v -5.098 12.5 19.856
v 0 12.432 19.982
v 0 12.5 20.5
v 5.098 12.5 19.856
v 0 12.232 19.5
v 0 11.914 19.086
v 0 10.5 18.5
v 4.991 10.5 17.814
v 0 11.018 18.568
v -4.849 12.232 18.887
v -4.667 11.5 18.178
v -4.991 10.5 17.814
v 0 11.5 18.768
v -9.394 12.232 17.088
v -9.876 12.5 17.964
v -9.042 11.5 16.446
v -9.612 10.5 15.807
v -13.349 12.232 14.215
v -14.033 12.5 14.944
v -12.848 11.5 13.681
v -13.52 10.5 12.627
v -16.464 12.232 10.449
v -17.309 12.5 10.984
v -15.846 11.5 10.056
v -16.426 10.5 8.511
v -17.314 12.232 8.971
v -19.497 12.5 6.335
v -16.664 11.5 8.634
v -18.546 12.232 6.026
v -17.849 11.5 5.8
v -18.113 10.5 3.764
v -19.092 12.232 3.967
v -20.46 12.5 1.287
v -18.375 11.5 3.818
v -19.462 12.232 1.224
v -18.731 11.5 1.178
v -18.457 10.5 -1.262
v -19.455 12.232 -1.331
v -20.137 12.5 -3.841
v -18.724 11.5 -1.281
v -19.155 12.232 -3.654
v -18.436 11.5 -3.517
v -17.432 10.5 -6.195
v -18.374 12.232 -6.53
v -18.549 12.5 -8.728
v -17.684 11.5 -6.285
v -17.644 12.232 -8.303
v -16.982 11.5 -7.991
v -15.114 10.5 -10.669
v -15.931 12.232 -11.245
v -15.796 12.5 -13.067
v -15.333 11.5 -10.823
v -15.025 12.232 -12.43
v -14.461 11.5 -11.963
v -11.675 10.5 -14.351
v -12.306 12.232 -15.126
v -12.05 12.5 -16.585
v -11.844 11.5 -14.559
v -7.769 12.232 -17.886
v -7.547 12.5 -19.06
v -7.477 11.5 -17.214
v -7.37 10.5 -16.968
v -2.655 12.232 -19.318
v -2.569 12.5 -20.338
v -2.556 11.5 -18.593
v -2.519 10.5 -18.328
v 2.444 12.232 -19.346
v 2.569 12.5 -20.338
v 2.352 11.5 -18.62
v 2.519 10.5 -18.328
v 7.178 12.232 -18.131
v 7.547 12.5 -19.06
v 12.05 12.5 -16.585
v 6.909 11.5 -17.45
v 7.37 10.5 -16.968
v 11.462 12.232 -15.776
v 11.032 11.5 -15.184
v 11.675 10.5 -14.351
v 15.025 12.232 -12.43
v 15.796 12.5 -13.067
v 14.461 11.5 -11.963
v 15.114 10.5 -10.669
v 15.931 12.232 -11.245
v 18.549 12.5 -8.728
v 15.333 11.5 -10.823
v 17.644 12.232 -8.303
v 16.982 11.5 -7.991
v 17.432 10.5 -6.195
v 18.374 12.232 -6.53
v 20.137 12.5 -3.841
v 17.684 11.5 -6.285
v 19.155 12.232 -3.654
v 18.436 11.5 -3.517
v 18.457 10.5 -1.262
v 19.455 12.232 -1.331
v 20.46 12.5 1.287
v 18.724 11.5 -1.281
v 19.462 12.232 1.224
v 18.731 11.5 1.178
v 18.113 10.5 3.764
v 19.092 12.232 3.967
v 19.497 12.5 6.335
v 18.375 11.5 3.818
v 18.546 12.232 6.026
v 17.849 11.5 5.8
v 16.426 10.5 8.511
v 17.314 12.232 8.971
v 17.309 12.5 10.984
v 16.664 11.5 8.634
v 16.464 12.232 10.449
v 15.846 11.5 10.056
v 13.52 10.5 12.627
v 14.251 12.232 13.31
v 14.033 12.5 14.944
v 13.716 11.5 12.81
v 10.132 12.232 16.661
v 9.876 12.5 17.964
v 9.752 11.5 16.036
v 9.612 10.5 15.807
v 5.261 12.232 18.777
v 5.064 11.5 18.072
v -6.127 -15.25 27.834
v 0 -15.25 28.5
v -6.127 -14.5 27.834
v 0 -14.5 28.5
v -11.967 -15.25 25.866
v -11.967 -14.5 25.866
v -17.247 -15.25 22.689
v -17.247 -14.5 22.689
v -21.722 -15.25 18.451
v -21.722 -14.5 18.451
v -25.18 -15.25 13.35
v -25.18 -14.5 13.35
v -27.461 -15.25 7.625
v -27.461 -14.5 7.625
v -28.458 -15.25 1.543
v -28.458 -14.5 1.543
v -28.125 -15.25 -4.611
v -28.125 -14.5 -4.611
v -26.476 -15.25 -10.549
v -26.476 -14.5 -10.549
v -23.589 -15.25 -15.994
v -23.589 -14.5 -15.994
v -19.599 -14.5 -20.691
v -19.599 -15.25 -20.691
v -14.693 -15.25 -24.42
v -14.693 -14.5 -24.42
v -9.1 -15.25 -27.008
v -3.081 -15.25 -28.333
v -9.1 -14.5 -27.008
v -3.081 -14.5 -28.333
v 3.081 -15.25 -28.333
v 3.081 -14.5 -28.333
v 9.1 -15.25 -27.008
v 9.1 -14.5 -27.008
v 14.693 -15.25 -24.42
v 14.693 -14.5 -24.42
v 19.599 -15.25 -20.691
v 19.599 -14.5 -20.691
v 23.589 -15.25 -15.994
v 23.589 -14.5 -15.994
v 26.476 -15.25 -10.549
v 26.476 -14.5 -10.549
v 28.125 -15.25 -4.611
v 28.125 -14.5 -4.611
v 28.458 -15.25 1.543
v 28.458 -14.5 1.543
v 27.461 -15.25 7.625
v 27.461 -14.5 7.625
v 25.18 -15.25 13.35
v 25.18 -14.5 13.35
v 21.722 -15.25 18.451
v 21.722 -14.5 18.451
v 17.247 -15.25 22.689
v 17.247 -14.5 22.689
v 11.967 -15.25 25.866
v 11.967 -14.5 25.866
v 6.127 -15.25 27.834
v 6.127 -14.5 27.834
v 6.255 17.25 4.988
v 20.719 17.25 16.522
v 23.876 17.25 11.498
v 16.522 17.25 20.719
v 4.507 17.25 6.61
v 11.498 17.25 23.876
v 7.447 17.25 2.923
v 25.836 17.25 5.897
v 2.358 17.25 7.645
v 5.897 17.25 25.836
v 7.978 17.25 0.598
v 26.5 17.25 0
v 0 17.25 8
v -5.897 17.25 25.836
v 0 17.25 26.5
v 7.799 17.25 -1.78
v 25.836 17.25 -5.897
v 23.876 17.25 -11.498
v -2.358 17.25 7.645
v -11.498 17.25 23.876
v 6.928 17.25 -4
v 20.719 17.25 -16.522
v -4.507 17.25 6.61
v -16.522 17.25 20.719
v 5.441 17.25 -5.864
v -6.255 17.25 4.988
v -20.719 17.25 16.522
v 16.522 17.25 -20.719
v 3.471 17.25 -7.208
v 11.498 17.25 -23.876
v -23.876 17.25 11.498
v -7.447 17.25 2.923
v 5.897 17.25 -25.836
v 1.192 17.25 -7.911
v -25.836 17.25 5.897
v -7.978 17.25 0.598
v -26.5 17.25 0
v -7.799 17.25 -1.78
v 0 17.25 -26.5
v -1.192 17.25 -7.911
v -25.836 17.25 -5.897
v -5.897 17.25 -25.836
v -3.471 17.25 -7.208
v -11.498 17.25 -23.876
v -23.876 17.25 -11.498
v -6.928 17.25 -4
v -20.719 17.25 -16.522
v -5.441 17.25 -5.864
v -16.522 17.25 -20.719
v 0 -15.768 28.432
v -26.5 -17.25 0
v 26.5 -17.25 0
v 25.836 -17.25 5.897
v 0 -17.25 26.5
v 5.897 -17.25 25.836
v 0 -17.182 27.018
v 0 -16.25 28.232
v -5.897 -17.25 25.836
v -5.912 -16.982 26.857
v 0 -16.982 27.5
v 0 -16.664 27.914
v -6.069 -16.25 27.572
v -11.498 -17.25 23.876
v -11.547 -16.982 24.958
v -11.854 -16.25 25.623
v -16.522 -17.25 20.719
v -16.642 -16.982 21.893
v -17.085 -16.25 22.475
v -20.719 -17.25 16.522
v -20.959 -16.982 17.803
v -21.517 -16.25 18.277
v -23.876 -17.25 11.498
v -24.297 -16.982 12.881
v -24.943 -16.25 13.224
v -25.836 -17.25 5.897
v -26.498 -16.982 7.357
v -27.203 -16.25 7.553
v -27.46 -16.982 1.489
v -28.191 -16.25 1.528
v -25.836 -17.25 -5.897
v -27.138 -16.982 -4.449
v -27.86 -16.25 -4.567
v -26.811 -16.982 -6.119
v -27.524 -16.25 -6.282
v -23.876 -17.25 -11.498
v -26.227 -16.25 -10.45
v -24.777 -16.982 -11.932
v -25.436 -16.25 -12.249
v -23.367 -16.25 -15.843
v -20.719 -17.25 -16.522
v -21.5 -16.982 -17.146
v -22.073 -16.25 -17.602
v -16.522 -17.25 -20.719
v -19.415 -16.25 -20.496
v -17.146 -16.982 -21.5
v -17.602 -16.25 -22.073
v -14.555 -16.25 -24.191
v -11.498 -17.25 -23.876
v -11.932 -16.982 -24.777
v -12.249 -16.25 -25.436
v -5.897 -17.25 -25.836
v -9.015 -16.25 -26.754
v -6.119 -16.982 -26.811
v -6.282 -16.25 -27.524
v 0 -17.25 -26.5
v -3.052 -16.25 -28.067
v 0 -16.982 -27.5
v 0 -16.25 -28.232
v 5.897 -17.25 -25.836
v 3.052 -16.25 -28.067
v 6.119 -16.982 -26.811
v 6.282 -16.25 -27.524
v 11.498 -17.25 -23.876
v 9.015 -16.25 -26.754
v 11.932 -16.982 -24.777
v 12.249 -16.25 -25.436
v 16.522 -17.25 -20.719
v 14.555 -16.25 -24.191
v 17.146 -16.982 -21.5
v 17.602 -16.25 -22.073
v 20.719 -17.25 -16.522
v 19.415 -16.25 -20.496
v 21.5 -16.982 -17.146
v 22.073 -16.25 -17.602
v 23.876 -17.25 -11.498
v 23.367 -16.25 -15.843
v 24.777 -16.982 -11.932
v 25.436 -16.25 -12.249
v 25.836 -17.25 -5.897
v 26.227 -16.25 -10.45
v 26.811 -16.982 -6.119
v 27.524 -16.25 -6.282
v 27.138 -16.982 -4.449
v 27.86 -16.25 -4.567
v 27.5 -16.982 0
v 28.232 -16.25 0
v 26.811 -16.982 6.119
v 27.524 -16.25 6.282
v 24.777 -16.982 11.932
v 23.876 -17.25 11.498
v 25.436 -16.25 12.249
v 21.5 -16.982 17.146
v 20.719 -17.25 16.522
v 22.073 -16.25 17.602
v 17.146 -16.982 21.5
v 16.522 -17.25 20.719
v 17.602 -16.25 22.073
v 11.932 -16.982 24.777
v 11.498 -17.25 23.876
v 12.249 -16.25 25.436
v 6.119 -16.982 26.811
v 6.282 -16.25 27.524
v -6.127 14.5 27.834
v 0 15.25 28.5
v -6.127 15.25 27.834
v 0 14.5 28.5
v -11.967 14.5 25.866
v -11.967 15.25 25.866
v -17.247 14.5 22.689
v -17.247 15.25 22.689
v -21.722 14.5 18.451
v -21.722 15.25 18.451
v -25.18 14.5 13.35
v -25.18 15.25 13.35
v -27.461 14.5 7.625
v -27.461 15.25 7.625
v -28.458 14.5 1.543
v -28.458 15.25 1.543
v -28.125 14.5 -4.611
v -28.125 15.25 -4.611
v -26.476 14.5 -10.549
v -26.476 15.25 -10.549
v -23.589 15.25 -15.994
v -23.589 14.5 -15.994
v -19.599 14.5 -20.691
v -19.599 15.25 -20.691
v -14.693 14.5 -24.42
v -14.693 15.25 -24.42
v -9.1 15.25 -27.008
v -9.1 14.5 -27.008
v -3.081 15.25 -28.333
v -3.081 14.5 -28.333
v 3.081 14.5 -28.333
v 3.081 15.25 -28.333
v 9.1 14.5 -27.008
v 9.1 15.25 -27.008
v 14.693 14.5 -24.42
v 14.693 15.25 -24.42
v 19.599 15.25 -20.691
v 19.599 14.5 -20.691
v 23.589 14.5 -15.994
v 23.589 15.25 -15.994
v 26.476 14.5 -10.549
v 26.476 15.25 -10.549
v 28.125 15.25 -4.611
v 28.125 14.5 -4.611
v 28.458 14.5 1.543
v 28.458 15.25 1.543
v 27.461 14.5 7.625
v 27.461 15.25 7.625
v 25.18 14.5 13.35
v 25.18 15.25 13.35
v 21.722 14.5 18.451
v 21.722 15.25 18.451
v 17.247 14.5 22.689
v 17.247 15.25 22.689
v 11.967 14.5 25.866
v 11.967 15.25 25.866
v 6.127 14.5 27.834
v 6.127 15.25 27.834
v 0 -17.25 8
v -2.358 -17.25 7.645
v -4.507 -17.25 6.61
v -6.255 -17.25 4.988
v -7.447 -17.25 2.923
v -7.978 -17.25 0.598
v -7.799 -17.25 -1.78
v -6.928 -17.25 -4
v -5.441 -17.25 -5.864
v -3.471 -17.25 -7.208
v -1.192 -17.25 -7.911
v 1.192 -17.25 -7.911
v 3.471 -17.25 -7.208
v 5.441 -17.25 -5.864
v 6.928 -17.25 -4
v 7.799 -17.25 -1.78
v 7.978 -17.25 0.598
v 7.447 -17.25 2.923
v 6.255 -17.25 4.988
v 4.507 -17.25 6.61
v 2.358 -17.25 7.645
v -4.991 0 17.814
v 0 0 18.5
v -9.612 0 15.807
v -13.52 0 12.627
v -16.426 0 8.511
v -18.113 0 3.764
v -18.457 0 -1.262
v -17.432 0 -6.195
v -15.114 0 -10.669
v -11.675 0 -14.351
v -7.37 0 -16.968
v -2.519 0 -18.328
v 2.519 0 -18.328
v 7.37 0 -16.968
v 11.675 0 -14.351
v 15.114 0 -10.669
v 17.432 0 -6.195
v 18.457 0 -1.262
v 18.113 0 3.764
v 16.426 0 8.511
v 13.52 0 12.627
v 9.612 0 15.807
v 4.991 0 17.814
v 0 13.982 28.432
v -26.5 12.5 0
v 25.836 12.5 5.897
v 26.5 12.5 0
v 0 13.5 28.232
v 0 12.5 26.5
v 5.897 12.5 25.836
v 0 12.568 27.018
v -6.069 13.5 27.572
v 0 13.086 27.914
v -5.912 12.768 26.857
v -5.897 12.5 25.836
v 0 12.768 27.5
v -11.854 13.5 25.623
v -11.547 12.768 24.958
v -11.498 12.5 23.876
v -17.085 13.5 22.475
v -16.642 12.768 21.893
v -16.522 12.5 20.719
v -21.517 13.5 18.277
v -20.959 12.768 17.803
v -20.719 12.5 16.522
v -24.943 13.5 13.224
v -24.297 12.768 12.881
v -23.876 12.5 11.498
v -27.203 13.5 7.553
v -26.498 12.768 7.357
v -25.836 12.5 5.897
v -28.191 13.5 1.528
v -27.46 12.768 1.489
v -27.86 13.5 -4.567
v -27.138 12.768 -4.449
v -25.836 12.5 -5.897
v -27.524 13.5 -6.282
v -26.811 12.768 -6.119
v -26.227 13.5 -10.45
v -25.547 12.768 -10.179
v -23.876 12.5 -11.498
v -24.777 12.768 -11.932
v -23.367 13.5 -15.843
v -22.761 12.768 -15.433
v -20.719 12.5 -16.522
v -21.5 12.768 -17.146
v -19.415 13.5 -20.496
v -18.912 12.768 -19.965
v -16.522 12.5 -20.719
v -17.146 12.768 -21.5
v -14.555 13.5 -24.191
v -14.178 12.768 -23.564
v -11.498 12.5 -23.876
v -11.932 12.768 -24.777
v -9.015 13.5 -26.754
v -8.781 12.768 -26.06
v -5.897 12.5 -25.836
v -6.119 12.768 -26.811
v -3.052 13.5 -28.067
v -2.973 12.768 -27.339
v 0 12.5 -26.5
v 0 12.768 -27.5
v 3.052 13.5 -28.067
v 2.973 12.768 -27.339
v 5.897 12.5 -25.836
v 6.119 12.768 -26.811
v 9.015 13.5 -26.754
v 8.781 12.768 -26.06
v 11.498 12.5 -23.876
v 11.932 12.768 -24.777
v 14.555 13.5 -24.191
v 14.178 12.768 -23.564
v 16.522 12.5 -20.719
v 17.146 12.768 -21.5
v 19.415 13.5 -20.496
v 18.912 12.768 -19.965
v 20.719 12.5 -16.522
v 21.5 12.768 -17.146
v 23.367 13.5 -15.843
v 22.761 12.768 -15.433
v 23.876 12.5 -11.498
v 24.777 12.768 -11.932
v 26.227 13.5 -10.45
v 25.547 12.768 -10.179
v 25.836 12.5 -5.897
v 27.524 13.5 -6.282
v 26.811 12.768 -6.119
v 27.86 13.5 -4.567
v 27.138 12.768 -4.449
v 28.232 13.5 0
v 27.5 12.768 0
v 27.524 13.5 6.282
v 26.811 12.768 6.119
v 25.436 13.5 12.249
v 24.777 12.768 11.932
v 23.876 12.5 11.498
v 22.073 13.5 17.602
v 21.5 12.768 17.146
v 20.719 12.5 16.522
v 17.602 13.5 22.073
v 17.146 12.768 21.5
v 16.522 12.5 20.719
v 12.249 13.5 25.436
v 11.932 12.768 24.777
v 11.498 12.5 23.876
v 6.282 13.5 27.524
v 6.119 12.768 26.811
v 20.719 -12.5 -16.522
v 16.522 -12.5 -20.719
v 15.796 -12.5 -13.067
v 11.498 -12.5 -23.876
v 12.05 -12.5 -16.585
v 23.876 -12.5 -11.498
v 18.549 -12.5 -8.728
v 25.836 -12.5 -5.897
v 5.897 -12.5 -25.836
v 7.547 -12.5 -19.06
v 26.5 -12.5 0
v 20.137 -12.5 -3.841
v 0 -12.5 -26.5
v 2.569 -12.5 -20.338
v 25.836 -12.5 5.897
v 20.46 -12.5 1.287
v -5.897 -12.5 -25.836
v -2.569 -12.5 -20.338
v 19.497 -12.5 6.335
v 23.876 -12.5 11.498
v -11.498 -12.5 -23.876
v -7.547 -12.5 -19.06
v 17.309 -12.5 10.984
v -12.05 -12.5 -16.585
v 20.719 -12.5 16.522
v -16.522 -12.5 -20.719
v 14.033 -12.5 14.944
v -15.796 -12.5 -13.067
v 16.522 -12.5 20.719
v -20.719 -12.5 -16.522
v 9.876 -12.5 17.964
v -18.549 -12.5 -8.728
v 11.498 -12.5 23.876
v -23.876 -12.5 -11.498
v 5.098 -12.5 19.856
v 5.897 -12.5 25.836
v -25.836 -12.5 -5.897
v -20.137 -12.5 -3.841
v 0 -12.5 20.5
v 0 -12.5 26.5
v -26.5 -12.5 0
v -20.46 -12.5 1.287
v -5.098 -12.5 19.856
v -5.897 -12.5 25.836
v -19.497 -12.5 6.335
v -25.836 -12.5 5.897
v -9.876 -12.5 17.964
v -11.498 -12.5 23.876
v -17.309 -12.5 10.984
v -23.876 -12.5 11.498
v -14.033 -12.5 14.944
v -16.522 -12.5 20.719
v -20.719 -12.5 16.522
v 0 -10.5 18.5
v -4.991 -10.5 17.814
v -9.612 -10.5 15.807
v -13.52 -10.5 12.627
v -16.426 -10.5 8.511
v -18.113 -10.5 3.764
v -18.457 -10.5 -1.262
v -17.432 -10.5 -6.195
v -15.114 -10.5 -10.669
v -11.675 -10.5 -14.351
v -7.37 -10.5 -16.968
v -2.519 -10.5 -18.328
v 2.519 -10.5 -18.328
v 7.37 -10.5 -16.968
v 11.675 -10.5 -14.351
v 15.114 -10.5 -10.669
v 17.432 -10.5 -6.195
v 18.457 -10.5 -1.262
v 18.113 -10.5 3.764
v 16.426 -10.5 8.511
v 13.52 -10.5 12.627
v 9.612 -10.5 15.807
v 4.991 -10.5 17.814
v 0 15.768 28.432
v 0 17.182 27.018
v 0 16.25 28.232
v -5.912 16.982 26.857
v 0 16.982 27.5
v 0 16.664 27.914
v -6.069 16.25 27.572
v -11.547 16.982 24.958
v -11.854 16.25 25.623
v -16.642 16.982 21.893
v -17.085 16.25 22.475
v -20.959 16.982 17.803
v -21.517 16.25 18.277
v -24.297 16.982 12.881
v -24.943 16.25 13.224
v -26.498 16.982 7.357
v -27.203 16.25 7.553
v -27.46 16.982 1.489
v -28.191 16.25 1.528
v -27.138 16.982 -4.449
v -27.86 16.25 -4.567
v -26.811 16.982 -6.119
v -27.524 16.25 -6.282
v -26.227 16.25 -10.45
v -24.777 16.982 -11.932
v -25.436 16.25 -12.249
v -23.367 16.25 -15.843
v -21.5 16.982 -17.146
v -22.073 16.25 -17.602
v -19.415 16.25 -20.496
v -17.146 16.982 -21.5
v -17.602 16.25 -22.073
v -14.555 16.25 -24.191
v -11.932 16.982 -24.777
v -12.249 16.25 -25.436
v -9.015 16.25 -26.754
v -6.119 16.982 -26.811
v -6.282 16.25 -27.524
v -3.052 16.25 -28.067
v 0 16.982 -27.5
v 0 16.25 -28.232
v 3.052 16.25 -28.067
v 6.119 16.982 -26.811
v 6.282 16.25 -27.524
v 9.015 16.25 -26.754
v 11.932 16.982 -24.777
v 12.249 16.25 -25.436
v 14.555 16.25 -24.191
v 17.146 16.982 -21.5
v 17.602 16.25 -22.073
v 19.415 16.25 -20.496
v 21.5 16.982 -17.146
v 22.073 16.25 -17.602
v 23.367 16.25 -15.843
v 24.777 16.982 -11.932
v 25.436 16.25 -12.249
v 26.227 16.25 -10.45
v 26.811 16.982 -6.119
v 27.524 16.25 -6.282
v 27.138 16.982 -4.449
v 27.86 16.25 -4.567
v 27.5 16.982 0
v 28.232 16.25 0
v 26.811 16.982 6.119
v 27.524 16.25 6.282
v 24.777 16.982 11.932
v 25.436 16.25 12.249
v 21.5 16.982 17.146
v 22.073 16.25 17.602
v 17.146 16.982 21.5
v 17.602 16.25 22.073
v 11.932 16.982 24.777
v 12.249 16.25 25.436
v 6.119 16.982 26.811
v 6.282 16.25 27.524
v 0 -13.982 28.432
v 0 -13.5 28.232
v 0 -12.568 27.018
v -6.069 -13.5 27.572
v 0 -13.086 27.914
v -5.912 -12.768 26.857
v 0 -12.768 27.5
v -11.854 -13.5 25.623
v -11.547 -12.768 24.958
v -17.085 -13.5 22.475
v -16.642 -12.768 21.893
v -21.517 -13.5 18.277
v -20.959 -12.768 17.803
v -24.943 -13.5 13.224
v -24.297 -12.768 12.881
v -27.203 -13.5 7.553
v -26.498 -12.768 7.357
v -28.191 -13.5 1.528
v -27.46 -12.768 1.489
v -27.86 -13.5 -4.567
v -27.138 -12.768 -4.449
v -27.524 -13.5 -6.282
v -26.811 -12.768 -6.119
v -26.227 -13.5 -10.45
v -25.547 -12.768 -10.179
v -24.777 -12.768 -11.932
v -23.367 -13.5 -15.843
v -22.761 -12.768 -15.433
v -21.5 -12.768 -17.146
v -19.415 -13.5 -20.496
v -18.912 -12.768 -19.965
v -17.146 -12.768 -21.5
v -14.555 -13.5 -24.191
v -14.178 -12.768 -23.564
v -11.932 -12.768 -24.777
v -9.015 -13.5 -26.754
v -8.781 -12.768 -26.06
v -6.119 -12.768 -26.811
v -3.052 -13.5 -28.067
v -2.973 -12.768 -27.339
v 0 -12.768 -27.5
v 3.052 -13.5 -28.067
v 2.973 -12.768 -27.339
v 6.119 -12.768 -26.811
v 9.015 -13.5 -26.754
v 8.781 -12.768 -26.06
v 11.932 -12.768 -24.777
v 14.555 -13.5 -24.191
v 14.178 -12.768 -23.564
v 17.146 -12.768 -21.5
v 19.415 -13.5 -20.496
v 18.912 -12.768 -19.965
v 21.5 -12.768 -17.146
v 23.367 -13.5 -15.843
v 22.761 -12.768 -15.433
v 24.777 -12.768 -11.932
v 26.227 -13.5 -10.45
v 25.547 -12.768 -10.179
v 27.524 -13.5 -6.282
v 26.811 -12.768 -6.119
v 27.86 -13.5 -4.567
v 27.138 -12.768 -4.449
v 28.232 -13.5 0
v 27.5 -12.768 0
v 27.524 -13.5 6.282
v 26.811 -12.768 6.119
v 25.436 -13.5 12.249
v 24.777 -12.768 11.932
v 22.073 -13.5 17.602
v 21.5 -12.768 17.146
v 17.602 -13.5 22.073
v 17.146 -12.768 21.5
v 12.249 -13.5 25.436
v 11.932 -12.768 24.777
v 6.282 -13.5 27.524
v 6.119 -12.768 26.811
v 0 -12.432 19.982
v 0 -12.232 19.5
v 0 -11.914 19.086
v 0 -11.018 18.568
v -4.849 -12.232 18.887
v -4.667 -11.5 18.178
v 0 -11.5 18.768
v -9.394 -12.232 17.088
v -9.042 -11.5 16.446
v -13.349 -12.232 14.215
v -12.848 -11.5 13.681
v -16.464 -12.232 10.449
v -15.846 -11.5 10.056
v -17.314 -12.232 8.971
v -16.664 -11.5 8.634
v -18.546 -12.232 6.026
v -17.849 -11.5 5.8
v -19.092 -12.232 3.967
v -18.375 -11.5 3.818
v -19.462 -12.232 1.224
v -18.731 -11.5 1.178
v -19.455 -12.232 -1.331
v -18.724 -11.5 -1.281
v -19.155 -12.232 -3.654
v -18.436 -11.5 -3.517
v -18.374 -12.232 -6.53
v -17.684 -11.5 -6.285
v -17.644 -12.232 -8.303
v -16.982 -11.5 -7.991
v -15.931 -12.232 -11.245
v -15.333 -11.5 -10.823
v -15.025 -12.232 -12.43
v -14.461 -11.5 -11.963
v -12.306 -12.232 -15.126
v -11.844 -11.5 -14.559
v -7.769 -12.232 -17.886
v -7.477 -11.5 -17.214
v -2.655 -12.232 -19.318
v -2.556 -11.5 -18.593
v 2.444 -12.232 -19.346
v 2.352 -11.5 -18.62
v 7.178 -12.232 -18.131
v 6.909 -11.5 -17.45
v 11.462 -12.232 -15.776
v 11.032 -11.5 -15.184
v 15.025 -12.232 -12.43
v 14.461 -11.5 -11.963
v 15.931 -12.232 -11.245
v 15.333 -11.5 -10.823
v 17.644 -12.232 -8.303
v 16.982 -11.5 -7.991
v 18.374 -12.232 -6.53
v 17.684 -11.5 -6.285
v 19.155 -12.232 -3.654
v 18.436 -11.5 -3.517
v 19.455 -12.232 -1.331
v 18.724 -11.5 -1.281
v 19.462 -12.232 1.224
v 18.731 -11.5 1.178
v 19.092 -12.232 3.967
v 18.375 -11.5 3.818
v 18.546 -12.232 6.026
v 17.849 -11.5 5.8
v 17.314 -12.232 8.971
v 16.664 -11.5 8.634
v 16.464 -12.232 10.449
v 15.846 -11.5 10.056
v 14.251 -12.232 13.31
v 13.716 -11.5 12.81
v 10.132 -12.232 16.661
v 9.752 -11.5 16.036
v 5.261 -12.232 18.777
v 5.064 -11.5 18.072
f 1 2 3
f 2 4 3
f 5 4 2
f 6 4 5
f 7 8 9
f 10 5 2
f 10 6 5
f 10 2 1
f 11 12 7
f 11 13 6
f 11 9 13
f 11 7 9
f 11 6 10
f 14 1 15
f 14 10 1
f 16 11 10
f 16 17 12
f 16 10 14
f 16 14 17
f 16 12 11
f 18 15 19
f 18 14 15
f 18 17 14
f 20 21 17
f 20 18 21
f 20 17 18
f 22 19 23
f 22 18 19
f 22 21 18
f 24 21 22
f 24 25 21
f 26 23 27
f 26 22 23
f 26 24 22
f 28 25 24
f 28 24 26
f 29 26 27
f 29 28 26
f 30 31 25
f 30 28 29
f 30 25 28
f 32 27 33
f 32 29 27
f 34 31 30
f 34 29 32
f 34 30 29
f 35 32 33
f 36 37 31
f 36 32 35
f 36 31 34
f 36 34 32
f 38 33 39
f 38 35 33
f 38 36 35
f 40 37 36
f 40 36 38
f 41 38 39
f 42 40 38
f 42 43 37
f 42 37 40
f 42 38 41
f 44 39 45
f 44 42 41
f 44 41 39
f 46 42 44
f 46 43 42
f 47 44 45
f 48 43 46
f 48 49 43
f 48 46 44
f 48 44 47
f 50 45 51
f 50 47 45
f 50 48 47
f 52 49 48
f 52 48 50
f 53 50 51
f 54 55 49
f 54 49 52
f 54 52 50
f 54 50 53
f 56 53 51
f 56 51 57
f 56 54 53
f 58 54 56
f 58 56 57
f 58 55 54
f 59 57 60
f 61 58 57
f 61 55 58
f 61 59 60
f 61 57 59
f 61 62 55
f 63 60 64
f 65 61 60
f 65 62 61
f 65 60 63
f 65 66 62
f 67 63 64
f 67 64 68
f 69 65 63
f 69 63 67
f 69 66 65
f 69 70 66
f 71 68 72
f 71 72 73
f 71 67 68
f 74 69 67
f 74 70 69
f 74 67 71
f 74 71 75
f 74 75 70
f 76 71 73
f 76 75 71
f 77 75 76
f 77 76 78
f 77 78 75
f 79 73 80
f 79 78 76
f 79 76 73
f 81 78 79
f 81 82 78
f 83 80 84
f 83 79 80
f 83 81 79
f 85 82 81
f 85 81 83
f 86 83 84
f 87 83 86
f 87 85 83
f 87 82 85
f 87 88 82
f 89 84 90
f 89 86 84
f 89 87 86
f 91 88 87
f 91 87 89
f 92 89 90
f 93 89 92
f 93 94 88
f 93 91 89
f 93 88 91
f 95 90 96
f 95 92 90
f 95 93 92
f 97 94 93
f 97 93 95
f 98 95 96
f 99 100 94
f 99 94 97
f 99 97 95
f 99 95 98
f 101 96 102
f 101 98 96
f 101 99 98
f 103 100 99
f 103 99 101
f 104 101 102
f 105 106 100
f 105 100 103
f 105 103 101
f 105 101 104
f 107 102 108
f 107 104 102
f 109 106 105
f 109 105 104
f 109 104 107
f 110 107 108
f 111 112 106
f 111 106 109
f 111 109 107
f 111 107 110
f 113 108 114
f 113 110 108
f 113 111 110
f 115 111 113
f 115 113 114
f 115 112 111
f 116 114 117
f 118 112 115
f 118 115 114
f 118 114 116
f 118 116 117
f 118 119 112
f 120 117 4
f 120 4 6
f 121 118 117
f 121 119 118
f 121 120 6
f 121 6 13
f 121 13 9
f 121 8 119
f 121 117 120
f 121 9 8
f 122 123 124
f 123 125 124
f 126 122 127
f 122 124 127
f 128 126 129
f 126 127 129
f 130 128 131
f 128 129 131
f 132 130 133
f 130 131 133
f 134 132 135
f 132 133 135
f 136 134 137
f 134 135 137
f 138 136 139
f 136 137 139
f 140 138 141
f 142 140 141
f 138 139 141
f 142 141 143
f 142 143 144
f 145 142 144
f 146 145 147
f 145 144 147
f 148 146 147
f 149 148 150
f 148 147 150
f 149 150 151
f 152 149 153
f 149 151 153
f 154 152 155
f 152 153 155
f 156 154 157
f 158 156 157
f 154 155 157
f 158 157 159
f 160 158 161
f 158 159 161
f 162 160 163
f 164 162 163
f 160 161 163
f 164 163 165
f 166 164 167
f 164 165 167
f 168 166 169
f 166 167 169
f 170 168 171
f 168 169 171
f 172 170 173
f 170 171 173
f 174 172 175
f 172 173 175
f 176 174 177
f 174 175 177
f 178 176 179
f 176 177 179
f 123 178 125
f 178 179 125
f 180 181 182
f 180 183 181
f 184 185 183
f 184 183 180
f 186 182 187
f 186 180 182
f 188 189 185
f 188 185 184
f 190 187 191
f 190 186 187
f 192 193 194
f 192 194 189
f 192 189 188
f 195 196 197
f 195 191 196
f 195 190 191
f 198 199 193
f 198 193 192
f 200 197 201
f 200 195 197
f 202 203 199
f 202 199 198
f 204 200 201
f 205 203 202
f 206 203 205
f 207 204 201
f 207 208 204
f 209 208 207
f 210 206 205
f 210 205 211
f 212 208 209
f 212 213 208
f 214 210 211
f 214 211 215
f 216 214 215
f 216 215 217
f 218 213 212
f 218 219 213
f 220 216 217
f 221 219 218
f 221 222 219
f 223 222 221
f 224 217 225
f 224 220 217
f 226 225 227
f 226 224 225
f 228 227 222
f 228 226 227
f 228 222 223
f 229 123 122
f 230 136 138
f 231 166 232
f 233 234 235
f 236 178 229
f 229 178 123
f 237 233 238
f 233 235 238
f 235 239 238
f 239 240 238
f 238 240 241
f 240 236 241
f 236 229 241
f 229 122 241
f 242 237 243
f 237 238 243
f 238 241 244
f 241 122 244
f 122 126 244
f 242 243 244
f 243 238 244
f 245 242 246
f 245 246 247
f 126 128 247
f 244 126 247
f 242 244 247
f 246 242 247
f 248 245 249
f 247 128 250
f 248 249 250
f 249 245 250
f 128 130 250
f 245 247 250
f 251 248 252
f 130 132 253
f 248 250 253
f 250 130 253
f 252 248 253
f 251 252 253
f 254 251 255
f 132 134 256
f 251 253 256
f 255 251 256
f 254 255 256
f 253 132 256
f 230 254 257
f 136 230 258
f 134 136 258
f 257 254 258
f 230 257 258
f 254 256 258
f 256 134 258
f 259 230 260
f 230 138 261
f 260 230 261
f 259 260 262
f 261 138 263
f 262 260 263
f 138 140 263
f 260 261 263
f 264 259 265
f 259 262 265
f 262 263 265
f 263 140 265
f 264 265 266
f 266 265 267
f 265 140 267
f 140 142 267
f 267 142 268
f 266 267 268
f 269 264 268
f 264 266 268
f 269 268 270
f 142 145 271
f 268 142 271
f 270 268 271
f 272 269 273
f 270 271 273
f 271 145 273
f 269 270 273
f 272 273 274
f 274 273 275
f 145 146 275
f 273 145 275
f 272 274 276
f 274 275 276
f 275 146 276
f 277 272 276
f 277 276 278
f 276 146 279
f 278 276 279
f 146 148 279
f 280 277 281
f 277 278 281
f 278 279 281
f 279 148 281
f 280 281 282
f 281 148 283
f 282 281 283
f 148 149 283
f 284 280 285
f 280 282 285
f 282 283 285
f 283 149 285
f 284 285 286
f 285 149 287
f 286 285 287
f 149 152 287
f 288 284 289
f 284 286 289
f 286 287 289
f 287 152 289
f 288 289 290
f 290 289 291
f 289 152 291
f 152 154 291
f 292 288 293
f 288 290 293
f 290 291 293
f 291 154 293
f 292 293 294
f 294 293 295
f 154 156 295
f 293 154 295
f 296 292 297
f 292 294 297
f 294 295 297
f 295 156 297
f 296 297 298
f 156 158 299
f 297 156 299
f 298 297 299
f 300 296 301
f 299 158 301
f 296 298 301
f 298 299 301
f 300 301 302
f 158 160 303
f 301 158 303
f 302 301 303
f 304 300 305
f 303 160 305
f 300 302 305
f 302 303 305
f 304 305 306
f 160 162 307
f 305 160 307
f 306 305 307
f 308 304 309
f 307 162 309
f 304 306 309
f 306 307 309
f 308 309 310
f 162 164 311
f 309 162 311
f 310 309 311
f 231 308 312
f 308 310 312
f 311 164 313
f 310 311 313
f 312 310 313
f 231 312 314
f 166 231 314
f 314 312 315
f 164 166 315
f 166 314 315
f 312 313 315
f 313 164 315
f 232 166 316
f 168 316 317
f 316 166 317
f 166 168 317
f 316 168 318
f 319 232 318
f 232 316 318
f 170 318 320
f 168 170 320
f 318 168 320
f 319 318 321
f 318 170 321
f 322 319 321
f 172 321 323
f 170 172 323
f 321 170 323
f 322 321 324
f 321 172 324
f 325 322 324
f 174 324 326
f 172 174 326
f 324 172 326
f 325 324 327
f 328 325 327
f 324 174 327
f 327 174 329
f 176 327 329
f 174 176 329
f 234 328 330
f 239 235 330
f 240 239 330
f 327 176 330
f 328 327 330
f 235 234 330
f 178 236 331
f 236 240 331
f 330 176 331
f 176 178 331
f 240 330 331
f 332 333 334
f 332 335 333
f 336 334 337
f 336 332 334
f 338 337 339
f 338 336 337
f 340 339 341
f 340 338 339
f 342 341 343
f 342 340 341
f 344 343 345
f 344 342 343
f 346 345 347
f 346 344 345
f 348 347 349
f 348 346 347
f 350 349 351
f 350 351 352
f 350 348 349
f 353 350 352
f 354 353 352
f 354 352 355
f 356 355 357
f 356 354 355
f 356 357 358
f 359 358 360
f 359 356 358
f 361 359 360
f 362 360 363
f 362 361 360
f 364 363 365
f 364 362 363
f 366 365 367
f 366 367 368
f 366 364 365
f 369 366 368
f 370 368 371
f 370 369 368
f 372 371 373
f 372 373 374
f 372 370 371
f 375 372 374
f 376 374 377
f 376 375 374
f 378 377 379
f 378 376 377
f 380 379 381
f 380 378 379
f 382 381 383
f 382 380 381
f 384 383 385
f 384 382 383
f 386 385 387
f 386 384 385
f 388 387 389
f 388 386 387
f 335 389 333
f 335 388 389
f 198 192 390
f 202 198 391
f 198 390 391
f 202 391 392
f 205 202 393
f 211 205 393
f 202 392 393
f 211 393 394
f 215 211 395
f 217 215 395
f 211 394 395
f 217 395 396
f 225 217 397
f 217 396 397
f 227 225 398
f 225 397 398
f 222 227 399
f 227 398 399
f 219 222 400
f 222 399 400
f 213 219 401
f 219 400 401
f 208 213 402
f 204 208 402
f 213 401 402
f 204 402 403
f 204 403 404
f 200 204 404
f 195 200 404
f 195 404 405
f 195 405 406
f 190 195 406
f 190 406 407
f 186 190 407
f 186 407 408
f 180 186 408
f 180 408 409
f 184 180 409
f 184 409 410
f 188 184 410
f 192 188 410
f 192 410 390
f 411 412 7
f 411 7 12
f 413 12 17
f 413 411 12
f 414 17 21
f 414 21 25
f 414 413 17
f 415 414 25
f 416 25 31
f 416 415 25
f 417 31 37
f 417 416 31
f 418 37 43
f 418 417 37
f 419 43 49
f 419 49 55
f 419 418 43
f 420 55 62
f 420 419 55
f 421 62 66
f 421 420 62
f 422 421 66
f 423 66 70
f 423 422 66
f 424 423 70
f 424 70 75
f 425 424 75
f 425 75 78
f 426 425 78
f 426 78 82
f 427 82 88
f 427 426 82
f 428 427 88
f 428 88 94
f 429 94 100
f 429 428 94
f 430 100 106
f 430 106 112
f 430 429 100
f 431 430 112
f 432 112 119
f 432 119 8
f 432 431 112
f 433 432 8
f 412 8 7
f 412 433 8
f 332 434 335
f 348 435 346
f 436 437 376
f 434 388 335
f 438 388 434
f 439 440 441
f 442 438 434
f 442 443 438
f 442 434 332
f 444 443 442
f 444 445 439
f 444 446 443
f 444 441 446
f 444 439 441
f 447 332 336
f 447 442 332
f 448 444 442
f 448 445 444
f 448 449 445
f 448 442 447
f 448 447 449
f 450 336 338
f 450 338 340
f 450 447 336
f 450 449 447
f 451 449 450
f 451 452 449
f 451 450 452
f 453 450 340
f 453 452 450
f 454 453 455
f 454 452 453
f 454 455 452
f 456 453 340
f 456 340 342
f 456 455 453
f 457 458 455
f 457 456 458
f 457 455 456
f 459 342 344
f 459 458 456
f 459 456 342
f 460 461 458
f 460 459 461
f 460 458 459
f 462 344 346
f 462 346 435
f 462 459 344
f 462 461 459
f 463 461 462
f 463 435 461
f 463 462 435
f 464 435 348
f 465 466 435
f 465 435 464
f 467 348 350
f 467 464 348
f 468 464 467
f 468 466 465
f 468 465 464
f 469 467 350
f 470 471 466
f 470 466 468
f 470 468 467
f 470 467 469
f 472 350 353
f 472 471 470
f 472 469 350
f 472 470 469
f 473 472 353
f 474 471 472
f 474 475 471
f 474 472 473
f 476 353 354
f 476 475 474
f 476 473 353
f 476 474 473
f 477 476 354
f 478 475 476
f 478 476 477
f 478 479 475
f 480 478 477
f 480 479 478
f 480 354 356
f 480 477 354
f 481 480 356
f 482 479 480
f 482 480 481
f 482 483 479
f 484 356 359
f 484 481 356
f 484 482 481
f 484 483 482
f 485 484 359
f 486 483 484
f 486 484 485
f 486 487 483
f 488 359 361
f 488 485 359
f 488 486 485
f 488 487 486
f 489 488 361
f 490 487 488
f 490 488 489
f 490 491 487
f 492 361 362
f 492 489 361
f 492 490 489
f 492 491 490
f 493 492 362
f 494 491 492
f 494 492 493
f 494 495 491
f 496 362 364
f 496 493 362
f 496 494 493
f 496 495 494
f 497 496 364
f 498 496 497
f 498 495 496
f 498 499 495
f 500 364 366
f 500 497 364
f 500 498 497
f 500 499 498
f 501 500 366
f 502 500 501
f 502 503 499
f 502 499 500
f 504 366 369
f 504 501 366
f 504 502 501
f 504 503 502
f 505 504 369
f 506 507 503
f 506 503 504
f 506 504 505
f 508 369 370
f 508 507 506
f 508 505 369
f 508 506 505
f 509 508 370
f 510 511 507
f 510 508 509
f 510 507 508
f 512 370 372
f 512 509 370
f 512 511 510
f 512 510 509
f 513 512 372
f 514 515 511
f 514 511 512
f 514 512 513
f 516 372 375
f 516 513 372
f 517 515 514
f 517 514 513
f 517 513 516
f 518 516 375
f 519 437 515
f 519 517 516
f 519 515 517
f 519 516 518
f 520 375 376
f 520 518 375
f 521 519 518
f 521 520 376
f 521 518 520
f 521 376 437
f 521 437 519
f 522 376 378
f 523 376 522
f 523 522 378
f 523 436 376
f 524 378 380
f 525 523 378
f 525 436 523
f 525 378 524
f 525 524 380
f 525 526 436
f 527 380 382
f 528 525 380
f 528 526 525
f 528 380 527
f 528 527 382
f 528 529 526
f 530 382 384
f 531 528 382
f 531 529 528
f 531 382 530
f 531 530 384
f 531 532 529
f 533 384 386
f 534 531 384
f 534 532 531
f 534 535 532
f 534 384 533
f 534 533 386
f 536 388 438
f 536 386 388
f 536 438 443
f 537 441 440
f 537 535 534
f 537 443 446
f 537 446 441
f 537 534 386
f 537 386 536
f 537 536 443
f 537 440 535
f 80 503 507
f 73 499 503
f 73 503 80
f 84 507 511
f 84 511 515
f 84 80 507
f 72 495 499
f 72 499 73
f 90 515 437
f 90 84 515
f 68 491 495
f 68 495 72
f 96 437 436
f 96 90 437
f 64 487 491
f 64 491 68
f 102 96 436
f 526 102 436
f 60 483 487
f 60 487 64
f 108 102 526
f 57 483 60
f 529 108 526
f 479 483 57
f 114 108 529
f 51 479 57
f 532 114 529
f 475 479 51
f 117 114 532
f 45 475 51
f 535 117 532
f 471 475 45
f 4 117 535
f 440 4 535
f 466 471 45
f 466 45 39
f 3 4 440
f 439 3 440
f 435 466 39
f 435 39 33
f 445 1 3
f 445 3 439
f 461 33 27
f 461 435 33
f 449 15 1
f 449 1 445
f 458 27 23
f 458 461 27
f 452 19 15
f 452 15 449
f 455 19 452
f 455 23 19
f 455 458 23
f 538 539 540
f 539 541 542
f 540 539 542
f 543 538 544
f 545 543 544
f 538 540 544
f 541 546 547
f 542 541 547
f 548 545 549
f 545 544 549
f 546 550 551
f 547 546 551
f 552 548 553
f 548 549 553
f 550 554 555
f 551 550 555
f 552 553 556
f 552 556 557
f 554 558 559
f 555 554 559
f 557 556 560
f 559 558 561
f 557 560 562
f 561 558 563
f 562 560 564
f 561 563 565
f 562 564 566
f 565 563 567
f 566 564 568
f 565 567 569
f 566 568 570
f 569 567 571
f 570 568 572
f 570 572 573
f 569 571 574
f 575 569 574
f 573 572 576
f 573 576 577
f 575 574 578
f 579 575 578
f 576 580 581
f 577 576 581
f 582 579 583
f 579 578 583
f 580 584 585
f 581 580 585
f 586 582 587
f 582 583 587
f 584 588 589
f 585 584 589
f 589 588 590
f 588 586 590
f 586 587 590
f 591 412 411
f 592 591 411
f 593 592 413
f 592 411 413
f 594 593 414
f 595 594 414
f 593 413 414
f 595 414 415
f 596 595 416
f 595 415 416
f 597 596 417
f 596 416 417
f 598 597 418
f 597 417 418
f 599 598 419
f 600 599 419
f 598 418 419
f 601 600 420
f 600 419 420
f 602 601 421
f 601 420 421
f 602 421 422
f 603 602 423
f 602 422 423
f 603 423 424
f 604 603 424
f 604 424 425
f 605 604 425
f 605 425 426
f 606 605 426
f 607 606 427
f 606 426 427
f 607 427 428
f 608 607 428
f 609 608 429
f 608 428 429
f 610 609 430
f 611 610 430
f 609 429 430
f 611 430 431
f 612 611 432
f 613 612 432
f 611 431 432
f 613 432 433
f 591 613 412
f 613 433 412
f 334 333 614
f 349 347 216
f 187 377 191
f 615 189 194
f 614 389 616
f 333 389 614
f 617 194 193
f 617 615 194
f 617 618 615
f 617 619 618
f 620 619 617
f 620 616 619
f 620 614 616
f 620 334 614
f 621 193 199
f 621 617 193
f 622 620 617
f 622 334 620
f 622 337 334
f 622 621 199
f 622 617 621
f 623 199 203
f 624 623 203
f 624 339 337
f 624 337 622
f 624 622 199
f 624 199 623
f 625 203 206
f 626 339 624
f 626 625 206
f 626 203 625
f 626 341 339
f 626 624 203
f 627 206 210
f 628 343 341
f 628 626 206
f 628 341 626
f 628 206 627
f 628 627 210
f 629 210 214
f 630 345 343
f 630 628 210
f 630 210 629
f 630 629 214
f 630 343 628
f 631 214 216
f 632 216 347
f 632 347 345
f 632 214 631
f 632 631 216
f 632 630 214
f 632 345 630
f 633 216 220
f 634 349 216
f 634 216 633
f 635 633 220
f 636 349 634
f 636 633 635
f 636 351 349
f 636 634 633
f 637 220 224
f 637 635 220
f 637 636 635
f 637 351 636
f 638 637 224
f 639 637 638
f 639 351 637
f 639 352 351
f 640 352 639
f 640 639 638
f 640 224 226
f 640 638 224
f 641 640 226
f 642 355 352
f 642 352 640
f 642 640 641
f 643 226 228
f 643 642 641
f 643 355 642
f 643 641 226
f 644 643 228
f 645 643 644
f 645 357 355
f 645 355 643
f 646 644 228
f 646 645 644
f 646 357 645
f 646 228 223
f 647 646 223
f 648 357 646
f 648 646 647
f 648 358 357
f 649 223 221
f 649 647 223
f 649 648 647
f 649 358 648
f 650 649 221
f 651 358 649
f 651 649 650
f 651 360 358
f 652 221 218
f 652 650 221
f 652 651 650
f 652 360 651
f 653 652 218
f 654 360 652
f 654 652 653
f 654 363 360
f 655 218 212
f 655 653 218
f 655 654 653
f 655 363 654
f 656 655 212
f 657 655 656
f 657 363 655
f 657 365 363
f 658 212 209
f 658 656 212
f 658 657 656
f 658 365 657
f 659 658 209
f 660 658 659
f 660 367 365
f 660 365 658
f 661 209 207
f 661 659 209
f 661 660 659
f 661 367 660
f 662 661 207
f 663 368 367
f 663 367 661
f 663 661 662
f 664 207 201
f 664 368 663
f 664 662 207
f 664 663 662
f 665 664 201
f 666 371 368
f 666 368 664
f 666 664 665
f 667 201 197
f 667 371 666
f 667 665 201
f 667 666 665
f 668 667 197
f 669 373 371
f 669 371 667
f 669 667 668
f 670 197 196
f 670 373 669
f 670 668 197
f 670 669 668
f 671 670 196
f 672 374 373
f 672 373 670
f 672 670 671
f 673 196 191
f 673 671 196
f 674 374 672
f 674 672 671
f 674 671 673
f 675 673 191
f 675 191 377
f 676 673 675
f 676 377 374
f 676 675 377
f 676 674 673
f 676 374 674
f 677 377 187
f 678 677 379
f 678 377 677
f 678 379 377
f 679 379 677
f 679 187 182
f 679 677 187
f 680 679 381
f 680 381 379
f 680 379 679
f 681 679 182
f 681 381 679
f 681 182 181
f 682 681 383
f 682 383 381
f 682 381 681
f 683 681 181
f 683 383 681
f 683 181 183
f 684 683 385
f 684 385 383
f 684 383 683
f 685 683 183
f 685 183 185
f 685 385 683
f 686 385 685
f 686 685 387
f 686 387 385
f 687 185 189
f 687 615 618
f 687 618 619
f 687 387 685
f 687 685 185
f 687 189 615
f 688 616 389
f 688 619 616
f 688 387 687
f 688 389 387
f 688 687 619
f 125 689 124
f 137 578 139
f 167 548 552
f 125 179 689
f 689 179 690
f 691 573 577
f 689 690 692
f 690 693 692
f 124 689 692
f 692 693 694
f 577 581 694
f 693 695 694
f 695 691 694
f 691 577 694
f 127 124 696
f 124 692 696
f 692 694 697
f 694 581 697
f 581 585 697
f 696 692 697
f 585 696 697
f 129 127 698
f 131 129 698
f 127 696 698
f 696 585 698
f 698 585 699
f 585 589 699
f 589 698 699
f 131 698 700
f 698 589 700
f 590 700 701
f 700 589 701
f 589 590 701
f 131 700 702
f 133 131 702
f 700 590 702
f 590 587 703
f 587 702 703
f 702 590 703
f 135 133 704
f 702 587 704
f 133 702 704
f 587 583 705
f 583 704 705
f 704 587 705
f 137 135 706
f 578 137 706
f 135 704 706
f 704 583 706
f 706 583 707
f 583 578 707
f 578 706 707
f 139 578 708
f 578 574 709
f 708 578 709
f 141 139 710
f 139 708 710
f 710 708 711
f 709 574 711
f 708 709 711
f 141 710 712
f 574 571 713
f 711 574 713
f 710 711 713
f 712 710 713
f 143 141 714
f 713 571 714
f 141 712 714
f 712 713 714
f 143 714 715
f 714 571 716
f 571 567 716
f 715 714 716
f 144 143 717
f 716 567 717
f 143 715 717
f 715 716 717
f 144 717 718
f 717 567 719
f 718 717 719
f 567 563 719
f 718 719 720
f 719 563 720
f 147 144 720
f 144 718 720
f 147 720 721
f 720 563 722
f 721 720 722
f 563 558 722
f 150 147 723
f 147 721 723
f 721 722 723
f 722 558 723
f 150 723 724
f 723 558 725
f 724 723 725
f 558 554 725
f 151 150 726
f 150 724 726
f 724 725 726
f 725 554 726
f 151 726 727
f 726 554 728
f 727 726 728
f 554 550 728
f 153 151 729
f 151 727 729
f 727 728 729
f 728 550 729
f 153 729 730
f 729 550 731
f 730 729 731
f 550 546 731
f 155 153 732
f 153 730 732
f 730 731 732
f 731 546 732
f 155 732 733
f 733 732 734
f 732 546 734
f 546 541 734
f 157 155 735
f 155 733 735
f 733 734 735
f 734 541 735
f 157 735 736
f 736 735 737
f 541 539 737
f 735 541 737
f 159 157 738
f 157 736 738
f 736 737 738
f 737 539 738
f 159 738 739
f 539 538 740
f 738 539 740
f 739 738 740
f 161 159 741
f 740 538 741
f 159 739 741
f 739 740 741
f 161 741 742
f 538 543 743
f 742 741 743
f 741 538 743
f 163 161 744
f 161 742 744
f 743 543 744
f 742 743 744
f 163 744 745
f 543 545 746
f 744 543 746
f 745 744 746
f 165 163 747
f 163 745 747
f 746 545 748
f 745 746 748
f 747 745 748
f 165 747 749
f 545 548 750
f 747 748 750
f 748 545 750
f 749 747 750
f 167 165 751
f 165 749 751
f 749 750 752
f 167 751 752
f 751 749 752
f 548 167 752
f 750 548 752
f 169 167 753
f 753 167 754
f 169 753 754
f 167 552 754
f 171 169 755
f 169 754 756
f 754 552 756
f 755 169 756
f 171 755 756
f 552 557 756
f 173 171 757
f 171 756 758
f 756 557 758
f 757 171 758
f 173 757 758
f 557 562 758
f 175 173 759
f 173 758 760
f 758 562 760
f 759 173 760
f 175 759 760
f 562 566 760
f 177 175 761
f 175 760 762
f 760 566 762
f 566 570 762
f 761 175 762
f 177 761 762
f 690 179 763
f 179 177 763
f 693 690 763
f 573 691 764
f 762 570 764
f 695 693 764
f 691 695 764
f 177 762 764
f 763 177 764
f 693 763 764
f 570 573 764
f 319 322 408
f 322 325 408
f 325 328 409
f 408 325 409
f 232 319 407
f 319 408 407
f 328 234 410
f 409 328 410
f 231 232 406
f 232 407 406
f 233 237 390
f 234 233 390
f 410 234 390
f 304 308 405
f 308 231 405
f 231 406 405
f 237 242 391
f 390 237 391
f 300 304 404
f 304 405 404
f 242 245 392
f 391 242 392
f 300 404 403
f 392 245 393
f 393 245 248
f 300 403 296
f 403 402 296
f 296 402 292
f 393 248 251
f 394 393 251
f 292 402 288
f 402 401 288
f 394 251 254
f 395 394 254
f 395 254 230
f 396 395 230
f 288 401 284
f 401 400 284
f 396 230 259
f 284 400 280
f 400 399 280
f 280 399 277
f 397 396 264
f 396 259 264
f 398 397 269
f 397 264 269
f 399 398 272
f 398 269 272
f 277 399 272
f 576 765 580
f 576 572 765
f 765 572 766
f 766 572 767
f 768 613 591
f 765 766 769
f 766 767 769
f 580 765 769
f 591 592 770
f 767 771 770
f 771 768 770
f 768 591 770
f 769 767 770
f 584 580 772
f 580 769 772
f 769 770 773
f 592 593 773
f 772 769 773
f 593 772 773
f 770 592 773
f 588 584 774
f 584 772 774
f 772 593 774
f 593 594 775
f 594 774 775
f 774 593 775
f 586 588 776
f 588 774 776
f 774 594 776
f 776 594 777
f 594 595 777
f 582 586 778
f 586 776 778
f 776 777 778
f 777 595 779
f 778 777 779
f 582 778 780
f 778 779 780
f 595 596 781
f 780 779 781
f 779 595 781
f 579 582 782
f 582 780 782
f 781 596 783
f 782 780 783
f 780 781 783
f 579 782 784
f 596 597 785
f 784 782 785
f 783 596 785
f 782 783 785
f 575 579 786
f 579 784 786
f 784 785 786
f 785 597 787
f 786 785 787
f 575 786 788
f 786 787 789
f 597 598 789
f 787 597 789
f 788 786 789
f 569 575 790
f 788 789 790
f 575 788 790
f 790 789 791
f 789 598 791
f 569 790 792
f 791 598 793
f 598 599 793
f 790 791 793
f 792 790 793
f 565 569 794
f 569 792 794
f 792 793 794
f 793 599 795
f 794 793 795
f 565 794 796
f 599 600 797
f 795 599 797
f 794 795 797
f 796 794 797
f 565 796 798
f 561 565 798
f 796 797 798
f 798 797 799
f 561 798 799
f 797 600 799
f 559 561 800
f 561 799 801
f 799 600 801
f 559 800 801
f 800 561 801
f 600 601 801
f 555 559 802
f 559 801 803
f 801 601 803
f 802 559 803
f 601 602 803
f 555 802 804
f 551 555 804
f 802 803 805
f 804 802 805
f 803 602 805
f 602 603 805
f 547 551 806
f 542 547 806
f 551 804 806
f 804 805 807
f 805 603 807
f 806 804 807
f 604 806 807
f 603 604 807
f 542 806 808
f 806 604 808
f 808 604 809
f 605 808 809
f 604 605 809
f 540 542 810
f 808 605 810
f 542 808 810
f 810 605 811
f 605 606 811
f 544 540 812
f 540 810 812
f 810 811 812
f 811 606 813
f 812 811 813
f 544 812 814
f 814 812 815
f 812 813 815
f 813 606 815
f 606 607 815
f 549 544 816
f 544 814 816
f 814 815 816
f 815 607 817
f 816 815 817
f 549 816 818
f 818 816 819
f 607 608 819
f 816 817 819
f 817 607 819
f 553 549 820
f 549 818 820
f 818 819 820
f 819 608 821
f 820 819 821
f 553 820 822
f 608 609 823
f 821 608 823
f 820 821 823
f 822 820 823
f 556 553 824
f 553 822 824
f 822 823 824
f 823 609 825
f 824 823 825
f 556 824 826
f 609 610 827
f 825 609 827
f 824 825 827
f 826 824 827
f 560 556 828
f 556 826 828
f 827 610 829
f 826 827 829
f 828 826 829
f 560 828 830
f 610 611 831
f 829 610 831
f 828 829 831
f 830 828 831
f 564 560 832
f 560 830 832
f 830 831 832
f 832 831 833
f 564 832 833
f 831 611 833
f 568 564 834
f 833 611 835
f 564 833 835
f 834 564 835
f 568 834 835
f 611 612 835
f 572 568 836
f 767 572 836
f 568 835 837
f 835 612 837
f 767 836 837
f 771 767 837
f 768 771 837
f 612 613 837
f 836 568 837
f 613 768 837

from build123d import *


with BuildPart() as part:
    # Sketch3 → Revolve1 (revolve)
    with BuildSketch(Plane(origin=(0, 0, 0), x_dir=(0, 0, -1), z_dir=(1, 0, 0)), mode=Mode.PRIVATE) as revolve1_sk:
        with BuildLine():
            Line((8, 0), (8, 17.25))
            Line((8, 17.25), (26.5, 17.25))
            ThreePointArc((26.5, 17.25), (27.914213562, 16.664213562), (28.5, 15.25))
            Line((28.5, 15.25), (28.5, 14.5))
            ThreePointArc((28.5, 14.5), (27.914213562, 13.085786438), (26.5, 12.5))
            Line((26.5, 12.5), (20.5, 12.5))
            ThreePointArc((20.5, 12.5), (19.085786438, 11.914213562), (18.5, 10.5))
            Line((18.5, 10.5), (18.5, 0))
            Line((18.5, 0), (8, 0))
        make_face()
    revolve1 = revolve(revolve1_sk.sketch.rotate(Axis((0, 18.1125, 0), (0, -1, 0)), 180), axis=Axis((0, 18.1125, 0), (0, -1, 0)))

    # Mirror1: Revolve1 across plane
    add(revolve1.mirror(Plane(origin=(0, 0, -18.5), x_dir=(0, 0, 1), z_dir=(0, 1, 0))))


solid = part.part
